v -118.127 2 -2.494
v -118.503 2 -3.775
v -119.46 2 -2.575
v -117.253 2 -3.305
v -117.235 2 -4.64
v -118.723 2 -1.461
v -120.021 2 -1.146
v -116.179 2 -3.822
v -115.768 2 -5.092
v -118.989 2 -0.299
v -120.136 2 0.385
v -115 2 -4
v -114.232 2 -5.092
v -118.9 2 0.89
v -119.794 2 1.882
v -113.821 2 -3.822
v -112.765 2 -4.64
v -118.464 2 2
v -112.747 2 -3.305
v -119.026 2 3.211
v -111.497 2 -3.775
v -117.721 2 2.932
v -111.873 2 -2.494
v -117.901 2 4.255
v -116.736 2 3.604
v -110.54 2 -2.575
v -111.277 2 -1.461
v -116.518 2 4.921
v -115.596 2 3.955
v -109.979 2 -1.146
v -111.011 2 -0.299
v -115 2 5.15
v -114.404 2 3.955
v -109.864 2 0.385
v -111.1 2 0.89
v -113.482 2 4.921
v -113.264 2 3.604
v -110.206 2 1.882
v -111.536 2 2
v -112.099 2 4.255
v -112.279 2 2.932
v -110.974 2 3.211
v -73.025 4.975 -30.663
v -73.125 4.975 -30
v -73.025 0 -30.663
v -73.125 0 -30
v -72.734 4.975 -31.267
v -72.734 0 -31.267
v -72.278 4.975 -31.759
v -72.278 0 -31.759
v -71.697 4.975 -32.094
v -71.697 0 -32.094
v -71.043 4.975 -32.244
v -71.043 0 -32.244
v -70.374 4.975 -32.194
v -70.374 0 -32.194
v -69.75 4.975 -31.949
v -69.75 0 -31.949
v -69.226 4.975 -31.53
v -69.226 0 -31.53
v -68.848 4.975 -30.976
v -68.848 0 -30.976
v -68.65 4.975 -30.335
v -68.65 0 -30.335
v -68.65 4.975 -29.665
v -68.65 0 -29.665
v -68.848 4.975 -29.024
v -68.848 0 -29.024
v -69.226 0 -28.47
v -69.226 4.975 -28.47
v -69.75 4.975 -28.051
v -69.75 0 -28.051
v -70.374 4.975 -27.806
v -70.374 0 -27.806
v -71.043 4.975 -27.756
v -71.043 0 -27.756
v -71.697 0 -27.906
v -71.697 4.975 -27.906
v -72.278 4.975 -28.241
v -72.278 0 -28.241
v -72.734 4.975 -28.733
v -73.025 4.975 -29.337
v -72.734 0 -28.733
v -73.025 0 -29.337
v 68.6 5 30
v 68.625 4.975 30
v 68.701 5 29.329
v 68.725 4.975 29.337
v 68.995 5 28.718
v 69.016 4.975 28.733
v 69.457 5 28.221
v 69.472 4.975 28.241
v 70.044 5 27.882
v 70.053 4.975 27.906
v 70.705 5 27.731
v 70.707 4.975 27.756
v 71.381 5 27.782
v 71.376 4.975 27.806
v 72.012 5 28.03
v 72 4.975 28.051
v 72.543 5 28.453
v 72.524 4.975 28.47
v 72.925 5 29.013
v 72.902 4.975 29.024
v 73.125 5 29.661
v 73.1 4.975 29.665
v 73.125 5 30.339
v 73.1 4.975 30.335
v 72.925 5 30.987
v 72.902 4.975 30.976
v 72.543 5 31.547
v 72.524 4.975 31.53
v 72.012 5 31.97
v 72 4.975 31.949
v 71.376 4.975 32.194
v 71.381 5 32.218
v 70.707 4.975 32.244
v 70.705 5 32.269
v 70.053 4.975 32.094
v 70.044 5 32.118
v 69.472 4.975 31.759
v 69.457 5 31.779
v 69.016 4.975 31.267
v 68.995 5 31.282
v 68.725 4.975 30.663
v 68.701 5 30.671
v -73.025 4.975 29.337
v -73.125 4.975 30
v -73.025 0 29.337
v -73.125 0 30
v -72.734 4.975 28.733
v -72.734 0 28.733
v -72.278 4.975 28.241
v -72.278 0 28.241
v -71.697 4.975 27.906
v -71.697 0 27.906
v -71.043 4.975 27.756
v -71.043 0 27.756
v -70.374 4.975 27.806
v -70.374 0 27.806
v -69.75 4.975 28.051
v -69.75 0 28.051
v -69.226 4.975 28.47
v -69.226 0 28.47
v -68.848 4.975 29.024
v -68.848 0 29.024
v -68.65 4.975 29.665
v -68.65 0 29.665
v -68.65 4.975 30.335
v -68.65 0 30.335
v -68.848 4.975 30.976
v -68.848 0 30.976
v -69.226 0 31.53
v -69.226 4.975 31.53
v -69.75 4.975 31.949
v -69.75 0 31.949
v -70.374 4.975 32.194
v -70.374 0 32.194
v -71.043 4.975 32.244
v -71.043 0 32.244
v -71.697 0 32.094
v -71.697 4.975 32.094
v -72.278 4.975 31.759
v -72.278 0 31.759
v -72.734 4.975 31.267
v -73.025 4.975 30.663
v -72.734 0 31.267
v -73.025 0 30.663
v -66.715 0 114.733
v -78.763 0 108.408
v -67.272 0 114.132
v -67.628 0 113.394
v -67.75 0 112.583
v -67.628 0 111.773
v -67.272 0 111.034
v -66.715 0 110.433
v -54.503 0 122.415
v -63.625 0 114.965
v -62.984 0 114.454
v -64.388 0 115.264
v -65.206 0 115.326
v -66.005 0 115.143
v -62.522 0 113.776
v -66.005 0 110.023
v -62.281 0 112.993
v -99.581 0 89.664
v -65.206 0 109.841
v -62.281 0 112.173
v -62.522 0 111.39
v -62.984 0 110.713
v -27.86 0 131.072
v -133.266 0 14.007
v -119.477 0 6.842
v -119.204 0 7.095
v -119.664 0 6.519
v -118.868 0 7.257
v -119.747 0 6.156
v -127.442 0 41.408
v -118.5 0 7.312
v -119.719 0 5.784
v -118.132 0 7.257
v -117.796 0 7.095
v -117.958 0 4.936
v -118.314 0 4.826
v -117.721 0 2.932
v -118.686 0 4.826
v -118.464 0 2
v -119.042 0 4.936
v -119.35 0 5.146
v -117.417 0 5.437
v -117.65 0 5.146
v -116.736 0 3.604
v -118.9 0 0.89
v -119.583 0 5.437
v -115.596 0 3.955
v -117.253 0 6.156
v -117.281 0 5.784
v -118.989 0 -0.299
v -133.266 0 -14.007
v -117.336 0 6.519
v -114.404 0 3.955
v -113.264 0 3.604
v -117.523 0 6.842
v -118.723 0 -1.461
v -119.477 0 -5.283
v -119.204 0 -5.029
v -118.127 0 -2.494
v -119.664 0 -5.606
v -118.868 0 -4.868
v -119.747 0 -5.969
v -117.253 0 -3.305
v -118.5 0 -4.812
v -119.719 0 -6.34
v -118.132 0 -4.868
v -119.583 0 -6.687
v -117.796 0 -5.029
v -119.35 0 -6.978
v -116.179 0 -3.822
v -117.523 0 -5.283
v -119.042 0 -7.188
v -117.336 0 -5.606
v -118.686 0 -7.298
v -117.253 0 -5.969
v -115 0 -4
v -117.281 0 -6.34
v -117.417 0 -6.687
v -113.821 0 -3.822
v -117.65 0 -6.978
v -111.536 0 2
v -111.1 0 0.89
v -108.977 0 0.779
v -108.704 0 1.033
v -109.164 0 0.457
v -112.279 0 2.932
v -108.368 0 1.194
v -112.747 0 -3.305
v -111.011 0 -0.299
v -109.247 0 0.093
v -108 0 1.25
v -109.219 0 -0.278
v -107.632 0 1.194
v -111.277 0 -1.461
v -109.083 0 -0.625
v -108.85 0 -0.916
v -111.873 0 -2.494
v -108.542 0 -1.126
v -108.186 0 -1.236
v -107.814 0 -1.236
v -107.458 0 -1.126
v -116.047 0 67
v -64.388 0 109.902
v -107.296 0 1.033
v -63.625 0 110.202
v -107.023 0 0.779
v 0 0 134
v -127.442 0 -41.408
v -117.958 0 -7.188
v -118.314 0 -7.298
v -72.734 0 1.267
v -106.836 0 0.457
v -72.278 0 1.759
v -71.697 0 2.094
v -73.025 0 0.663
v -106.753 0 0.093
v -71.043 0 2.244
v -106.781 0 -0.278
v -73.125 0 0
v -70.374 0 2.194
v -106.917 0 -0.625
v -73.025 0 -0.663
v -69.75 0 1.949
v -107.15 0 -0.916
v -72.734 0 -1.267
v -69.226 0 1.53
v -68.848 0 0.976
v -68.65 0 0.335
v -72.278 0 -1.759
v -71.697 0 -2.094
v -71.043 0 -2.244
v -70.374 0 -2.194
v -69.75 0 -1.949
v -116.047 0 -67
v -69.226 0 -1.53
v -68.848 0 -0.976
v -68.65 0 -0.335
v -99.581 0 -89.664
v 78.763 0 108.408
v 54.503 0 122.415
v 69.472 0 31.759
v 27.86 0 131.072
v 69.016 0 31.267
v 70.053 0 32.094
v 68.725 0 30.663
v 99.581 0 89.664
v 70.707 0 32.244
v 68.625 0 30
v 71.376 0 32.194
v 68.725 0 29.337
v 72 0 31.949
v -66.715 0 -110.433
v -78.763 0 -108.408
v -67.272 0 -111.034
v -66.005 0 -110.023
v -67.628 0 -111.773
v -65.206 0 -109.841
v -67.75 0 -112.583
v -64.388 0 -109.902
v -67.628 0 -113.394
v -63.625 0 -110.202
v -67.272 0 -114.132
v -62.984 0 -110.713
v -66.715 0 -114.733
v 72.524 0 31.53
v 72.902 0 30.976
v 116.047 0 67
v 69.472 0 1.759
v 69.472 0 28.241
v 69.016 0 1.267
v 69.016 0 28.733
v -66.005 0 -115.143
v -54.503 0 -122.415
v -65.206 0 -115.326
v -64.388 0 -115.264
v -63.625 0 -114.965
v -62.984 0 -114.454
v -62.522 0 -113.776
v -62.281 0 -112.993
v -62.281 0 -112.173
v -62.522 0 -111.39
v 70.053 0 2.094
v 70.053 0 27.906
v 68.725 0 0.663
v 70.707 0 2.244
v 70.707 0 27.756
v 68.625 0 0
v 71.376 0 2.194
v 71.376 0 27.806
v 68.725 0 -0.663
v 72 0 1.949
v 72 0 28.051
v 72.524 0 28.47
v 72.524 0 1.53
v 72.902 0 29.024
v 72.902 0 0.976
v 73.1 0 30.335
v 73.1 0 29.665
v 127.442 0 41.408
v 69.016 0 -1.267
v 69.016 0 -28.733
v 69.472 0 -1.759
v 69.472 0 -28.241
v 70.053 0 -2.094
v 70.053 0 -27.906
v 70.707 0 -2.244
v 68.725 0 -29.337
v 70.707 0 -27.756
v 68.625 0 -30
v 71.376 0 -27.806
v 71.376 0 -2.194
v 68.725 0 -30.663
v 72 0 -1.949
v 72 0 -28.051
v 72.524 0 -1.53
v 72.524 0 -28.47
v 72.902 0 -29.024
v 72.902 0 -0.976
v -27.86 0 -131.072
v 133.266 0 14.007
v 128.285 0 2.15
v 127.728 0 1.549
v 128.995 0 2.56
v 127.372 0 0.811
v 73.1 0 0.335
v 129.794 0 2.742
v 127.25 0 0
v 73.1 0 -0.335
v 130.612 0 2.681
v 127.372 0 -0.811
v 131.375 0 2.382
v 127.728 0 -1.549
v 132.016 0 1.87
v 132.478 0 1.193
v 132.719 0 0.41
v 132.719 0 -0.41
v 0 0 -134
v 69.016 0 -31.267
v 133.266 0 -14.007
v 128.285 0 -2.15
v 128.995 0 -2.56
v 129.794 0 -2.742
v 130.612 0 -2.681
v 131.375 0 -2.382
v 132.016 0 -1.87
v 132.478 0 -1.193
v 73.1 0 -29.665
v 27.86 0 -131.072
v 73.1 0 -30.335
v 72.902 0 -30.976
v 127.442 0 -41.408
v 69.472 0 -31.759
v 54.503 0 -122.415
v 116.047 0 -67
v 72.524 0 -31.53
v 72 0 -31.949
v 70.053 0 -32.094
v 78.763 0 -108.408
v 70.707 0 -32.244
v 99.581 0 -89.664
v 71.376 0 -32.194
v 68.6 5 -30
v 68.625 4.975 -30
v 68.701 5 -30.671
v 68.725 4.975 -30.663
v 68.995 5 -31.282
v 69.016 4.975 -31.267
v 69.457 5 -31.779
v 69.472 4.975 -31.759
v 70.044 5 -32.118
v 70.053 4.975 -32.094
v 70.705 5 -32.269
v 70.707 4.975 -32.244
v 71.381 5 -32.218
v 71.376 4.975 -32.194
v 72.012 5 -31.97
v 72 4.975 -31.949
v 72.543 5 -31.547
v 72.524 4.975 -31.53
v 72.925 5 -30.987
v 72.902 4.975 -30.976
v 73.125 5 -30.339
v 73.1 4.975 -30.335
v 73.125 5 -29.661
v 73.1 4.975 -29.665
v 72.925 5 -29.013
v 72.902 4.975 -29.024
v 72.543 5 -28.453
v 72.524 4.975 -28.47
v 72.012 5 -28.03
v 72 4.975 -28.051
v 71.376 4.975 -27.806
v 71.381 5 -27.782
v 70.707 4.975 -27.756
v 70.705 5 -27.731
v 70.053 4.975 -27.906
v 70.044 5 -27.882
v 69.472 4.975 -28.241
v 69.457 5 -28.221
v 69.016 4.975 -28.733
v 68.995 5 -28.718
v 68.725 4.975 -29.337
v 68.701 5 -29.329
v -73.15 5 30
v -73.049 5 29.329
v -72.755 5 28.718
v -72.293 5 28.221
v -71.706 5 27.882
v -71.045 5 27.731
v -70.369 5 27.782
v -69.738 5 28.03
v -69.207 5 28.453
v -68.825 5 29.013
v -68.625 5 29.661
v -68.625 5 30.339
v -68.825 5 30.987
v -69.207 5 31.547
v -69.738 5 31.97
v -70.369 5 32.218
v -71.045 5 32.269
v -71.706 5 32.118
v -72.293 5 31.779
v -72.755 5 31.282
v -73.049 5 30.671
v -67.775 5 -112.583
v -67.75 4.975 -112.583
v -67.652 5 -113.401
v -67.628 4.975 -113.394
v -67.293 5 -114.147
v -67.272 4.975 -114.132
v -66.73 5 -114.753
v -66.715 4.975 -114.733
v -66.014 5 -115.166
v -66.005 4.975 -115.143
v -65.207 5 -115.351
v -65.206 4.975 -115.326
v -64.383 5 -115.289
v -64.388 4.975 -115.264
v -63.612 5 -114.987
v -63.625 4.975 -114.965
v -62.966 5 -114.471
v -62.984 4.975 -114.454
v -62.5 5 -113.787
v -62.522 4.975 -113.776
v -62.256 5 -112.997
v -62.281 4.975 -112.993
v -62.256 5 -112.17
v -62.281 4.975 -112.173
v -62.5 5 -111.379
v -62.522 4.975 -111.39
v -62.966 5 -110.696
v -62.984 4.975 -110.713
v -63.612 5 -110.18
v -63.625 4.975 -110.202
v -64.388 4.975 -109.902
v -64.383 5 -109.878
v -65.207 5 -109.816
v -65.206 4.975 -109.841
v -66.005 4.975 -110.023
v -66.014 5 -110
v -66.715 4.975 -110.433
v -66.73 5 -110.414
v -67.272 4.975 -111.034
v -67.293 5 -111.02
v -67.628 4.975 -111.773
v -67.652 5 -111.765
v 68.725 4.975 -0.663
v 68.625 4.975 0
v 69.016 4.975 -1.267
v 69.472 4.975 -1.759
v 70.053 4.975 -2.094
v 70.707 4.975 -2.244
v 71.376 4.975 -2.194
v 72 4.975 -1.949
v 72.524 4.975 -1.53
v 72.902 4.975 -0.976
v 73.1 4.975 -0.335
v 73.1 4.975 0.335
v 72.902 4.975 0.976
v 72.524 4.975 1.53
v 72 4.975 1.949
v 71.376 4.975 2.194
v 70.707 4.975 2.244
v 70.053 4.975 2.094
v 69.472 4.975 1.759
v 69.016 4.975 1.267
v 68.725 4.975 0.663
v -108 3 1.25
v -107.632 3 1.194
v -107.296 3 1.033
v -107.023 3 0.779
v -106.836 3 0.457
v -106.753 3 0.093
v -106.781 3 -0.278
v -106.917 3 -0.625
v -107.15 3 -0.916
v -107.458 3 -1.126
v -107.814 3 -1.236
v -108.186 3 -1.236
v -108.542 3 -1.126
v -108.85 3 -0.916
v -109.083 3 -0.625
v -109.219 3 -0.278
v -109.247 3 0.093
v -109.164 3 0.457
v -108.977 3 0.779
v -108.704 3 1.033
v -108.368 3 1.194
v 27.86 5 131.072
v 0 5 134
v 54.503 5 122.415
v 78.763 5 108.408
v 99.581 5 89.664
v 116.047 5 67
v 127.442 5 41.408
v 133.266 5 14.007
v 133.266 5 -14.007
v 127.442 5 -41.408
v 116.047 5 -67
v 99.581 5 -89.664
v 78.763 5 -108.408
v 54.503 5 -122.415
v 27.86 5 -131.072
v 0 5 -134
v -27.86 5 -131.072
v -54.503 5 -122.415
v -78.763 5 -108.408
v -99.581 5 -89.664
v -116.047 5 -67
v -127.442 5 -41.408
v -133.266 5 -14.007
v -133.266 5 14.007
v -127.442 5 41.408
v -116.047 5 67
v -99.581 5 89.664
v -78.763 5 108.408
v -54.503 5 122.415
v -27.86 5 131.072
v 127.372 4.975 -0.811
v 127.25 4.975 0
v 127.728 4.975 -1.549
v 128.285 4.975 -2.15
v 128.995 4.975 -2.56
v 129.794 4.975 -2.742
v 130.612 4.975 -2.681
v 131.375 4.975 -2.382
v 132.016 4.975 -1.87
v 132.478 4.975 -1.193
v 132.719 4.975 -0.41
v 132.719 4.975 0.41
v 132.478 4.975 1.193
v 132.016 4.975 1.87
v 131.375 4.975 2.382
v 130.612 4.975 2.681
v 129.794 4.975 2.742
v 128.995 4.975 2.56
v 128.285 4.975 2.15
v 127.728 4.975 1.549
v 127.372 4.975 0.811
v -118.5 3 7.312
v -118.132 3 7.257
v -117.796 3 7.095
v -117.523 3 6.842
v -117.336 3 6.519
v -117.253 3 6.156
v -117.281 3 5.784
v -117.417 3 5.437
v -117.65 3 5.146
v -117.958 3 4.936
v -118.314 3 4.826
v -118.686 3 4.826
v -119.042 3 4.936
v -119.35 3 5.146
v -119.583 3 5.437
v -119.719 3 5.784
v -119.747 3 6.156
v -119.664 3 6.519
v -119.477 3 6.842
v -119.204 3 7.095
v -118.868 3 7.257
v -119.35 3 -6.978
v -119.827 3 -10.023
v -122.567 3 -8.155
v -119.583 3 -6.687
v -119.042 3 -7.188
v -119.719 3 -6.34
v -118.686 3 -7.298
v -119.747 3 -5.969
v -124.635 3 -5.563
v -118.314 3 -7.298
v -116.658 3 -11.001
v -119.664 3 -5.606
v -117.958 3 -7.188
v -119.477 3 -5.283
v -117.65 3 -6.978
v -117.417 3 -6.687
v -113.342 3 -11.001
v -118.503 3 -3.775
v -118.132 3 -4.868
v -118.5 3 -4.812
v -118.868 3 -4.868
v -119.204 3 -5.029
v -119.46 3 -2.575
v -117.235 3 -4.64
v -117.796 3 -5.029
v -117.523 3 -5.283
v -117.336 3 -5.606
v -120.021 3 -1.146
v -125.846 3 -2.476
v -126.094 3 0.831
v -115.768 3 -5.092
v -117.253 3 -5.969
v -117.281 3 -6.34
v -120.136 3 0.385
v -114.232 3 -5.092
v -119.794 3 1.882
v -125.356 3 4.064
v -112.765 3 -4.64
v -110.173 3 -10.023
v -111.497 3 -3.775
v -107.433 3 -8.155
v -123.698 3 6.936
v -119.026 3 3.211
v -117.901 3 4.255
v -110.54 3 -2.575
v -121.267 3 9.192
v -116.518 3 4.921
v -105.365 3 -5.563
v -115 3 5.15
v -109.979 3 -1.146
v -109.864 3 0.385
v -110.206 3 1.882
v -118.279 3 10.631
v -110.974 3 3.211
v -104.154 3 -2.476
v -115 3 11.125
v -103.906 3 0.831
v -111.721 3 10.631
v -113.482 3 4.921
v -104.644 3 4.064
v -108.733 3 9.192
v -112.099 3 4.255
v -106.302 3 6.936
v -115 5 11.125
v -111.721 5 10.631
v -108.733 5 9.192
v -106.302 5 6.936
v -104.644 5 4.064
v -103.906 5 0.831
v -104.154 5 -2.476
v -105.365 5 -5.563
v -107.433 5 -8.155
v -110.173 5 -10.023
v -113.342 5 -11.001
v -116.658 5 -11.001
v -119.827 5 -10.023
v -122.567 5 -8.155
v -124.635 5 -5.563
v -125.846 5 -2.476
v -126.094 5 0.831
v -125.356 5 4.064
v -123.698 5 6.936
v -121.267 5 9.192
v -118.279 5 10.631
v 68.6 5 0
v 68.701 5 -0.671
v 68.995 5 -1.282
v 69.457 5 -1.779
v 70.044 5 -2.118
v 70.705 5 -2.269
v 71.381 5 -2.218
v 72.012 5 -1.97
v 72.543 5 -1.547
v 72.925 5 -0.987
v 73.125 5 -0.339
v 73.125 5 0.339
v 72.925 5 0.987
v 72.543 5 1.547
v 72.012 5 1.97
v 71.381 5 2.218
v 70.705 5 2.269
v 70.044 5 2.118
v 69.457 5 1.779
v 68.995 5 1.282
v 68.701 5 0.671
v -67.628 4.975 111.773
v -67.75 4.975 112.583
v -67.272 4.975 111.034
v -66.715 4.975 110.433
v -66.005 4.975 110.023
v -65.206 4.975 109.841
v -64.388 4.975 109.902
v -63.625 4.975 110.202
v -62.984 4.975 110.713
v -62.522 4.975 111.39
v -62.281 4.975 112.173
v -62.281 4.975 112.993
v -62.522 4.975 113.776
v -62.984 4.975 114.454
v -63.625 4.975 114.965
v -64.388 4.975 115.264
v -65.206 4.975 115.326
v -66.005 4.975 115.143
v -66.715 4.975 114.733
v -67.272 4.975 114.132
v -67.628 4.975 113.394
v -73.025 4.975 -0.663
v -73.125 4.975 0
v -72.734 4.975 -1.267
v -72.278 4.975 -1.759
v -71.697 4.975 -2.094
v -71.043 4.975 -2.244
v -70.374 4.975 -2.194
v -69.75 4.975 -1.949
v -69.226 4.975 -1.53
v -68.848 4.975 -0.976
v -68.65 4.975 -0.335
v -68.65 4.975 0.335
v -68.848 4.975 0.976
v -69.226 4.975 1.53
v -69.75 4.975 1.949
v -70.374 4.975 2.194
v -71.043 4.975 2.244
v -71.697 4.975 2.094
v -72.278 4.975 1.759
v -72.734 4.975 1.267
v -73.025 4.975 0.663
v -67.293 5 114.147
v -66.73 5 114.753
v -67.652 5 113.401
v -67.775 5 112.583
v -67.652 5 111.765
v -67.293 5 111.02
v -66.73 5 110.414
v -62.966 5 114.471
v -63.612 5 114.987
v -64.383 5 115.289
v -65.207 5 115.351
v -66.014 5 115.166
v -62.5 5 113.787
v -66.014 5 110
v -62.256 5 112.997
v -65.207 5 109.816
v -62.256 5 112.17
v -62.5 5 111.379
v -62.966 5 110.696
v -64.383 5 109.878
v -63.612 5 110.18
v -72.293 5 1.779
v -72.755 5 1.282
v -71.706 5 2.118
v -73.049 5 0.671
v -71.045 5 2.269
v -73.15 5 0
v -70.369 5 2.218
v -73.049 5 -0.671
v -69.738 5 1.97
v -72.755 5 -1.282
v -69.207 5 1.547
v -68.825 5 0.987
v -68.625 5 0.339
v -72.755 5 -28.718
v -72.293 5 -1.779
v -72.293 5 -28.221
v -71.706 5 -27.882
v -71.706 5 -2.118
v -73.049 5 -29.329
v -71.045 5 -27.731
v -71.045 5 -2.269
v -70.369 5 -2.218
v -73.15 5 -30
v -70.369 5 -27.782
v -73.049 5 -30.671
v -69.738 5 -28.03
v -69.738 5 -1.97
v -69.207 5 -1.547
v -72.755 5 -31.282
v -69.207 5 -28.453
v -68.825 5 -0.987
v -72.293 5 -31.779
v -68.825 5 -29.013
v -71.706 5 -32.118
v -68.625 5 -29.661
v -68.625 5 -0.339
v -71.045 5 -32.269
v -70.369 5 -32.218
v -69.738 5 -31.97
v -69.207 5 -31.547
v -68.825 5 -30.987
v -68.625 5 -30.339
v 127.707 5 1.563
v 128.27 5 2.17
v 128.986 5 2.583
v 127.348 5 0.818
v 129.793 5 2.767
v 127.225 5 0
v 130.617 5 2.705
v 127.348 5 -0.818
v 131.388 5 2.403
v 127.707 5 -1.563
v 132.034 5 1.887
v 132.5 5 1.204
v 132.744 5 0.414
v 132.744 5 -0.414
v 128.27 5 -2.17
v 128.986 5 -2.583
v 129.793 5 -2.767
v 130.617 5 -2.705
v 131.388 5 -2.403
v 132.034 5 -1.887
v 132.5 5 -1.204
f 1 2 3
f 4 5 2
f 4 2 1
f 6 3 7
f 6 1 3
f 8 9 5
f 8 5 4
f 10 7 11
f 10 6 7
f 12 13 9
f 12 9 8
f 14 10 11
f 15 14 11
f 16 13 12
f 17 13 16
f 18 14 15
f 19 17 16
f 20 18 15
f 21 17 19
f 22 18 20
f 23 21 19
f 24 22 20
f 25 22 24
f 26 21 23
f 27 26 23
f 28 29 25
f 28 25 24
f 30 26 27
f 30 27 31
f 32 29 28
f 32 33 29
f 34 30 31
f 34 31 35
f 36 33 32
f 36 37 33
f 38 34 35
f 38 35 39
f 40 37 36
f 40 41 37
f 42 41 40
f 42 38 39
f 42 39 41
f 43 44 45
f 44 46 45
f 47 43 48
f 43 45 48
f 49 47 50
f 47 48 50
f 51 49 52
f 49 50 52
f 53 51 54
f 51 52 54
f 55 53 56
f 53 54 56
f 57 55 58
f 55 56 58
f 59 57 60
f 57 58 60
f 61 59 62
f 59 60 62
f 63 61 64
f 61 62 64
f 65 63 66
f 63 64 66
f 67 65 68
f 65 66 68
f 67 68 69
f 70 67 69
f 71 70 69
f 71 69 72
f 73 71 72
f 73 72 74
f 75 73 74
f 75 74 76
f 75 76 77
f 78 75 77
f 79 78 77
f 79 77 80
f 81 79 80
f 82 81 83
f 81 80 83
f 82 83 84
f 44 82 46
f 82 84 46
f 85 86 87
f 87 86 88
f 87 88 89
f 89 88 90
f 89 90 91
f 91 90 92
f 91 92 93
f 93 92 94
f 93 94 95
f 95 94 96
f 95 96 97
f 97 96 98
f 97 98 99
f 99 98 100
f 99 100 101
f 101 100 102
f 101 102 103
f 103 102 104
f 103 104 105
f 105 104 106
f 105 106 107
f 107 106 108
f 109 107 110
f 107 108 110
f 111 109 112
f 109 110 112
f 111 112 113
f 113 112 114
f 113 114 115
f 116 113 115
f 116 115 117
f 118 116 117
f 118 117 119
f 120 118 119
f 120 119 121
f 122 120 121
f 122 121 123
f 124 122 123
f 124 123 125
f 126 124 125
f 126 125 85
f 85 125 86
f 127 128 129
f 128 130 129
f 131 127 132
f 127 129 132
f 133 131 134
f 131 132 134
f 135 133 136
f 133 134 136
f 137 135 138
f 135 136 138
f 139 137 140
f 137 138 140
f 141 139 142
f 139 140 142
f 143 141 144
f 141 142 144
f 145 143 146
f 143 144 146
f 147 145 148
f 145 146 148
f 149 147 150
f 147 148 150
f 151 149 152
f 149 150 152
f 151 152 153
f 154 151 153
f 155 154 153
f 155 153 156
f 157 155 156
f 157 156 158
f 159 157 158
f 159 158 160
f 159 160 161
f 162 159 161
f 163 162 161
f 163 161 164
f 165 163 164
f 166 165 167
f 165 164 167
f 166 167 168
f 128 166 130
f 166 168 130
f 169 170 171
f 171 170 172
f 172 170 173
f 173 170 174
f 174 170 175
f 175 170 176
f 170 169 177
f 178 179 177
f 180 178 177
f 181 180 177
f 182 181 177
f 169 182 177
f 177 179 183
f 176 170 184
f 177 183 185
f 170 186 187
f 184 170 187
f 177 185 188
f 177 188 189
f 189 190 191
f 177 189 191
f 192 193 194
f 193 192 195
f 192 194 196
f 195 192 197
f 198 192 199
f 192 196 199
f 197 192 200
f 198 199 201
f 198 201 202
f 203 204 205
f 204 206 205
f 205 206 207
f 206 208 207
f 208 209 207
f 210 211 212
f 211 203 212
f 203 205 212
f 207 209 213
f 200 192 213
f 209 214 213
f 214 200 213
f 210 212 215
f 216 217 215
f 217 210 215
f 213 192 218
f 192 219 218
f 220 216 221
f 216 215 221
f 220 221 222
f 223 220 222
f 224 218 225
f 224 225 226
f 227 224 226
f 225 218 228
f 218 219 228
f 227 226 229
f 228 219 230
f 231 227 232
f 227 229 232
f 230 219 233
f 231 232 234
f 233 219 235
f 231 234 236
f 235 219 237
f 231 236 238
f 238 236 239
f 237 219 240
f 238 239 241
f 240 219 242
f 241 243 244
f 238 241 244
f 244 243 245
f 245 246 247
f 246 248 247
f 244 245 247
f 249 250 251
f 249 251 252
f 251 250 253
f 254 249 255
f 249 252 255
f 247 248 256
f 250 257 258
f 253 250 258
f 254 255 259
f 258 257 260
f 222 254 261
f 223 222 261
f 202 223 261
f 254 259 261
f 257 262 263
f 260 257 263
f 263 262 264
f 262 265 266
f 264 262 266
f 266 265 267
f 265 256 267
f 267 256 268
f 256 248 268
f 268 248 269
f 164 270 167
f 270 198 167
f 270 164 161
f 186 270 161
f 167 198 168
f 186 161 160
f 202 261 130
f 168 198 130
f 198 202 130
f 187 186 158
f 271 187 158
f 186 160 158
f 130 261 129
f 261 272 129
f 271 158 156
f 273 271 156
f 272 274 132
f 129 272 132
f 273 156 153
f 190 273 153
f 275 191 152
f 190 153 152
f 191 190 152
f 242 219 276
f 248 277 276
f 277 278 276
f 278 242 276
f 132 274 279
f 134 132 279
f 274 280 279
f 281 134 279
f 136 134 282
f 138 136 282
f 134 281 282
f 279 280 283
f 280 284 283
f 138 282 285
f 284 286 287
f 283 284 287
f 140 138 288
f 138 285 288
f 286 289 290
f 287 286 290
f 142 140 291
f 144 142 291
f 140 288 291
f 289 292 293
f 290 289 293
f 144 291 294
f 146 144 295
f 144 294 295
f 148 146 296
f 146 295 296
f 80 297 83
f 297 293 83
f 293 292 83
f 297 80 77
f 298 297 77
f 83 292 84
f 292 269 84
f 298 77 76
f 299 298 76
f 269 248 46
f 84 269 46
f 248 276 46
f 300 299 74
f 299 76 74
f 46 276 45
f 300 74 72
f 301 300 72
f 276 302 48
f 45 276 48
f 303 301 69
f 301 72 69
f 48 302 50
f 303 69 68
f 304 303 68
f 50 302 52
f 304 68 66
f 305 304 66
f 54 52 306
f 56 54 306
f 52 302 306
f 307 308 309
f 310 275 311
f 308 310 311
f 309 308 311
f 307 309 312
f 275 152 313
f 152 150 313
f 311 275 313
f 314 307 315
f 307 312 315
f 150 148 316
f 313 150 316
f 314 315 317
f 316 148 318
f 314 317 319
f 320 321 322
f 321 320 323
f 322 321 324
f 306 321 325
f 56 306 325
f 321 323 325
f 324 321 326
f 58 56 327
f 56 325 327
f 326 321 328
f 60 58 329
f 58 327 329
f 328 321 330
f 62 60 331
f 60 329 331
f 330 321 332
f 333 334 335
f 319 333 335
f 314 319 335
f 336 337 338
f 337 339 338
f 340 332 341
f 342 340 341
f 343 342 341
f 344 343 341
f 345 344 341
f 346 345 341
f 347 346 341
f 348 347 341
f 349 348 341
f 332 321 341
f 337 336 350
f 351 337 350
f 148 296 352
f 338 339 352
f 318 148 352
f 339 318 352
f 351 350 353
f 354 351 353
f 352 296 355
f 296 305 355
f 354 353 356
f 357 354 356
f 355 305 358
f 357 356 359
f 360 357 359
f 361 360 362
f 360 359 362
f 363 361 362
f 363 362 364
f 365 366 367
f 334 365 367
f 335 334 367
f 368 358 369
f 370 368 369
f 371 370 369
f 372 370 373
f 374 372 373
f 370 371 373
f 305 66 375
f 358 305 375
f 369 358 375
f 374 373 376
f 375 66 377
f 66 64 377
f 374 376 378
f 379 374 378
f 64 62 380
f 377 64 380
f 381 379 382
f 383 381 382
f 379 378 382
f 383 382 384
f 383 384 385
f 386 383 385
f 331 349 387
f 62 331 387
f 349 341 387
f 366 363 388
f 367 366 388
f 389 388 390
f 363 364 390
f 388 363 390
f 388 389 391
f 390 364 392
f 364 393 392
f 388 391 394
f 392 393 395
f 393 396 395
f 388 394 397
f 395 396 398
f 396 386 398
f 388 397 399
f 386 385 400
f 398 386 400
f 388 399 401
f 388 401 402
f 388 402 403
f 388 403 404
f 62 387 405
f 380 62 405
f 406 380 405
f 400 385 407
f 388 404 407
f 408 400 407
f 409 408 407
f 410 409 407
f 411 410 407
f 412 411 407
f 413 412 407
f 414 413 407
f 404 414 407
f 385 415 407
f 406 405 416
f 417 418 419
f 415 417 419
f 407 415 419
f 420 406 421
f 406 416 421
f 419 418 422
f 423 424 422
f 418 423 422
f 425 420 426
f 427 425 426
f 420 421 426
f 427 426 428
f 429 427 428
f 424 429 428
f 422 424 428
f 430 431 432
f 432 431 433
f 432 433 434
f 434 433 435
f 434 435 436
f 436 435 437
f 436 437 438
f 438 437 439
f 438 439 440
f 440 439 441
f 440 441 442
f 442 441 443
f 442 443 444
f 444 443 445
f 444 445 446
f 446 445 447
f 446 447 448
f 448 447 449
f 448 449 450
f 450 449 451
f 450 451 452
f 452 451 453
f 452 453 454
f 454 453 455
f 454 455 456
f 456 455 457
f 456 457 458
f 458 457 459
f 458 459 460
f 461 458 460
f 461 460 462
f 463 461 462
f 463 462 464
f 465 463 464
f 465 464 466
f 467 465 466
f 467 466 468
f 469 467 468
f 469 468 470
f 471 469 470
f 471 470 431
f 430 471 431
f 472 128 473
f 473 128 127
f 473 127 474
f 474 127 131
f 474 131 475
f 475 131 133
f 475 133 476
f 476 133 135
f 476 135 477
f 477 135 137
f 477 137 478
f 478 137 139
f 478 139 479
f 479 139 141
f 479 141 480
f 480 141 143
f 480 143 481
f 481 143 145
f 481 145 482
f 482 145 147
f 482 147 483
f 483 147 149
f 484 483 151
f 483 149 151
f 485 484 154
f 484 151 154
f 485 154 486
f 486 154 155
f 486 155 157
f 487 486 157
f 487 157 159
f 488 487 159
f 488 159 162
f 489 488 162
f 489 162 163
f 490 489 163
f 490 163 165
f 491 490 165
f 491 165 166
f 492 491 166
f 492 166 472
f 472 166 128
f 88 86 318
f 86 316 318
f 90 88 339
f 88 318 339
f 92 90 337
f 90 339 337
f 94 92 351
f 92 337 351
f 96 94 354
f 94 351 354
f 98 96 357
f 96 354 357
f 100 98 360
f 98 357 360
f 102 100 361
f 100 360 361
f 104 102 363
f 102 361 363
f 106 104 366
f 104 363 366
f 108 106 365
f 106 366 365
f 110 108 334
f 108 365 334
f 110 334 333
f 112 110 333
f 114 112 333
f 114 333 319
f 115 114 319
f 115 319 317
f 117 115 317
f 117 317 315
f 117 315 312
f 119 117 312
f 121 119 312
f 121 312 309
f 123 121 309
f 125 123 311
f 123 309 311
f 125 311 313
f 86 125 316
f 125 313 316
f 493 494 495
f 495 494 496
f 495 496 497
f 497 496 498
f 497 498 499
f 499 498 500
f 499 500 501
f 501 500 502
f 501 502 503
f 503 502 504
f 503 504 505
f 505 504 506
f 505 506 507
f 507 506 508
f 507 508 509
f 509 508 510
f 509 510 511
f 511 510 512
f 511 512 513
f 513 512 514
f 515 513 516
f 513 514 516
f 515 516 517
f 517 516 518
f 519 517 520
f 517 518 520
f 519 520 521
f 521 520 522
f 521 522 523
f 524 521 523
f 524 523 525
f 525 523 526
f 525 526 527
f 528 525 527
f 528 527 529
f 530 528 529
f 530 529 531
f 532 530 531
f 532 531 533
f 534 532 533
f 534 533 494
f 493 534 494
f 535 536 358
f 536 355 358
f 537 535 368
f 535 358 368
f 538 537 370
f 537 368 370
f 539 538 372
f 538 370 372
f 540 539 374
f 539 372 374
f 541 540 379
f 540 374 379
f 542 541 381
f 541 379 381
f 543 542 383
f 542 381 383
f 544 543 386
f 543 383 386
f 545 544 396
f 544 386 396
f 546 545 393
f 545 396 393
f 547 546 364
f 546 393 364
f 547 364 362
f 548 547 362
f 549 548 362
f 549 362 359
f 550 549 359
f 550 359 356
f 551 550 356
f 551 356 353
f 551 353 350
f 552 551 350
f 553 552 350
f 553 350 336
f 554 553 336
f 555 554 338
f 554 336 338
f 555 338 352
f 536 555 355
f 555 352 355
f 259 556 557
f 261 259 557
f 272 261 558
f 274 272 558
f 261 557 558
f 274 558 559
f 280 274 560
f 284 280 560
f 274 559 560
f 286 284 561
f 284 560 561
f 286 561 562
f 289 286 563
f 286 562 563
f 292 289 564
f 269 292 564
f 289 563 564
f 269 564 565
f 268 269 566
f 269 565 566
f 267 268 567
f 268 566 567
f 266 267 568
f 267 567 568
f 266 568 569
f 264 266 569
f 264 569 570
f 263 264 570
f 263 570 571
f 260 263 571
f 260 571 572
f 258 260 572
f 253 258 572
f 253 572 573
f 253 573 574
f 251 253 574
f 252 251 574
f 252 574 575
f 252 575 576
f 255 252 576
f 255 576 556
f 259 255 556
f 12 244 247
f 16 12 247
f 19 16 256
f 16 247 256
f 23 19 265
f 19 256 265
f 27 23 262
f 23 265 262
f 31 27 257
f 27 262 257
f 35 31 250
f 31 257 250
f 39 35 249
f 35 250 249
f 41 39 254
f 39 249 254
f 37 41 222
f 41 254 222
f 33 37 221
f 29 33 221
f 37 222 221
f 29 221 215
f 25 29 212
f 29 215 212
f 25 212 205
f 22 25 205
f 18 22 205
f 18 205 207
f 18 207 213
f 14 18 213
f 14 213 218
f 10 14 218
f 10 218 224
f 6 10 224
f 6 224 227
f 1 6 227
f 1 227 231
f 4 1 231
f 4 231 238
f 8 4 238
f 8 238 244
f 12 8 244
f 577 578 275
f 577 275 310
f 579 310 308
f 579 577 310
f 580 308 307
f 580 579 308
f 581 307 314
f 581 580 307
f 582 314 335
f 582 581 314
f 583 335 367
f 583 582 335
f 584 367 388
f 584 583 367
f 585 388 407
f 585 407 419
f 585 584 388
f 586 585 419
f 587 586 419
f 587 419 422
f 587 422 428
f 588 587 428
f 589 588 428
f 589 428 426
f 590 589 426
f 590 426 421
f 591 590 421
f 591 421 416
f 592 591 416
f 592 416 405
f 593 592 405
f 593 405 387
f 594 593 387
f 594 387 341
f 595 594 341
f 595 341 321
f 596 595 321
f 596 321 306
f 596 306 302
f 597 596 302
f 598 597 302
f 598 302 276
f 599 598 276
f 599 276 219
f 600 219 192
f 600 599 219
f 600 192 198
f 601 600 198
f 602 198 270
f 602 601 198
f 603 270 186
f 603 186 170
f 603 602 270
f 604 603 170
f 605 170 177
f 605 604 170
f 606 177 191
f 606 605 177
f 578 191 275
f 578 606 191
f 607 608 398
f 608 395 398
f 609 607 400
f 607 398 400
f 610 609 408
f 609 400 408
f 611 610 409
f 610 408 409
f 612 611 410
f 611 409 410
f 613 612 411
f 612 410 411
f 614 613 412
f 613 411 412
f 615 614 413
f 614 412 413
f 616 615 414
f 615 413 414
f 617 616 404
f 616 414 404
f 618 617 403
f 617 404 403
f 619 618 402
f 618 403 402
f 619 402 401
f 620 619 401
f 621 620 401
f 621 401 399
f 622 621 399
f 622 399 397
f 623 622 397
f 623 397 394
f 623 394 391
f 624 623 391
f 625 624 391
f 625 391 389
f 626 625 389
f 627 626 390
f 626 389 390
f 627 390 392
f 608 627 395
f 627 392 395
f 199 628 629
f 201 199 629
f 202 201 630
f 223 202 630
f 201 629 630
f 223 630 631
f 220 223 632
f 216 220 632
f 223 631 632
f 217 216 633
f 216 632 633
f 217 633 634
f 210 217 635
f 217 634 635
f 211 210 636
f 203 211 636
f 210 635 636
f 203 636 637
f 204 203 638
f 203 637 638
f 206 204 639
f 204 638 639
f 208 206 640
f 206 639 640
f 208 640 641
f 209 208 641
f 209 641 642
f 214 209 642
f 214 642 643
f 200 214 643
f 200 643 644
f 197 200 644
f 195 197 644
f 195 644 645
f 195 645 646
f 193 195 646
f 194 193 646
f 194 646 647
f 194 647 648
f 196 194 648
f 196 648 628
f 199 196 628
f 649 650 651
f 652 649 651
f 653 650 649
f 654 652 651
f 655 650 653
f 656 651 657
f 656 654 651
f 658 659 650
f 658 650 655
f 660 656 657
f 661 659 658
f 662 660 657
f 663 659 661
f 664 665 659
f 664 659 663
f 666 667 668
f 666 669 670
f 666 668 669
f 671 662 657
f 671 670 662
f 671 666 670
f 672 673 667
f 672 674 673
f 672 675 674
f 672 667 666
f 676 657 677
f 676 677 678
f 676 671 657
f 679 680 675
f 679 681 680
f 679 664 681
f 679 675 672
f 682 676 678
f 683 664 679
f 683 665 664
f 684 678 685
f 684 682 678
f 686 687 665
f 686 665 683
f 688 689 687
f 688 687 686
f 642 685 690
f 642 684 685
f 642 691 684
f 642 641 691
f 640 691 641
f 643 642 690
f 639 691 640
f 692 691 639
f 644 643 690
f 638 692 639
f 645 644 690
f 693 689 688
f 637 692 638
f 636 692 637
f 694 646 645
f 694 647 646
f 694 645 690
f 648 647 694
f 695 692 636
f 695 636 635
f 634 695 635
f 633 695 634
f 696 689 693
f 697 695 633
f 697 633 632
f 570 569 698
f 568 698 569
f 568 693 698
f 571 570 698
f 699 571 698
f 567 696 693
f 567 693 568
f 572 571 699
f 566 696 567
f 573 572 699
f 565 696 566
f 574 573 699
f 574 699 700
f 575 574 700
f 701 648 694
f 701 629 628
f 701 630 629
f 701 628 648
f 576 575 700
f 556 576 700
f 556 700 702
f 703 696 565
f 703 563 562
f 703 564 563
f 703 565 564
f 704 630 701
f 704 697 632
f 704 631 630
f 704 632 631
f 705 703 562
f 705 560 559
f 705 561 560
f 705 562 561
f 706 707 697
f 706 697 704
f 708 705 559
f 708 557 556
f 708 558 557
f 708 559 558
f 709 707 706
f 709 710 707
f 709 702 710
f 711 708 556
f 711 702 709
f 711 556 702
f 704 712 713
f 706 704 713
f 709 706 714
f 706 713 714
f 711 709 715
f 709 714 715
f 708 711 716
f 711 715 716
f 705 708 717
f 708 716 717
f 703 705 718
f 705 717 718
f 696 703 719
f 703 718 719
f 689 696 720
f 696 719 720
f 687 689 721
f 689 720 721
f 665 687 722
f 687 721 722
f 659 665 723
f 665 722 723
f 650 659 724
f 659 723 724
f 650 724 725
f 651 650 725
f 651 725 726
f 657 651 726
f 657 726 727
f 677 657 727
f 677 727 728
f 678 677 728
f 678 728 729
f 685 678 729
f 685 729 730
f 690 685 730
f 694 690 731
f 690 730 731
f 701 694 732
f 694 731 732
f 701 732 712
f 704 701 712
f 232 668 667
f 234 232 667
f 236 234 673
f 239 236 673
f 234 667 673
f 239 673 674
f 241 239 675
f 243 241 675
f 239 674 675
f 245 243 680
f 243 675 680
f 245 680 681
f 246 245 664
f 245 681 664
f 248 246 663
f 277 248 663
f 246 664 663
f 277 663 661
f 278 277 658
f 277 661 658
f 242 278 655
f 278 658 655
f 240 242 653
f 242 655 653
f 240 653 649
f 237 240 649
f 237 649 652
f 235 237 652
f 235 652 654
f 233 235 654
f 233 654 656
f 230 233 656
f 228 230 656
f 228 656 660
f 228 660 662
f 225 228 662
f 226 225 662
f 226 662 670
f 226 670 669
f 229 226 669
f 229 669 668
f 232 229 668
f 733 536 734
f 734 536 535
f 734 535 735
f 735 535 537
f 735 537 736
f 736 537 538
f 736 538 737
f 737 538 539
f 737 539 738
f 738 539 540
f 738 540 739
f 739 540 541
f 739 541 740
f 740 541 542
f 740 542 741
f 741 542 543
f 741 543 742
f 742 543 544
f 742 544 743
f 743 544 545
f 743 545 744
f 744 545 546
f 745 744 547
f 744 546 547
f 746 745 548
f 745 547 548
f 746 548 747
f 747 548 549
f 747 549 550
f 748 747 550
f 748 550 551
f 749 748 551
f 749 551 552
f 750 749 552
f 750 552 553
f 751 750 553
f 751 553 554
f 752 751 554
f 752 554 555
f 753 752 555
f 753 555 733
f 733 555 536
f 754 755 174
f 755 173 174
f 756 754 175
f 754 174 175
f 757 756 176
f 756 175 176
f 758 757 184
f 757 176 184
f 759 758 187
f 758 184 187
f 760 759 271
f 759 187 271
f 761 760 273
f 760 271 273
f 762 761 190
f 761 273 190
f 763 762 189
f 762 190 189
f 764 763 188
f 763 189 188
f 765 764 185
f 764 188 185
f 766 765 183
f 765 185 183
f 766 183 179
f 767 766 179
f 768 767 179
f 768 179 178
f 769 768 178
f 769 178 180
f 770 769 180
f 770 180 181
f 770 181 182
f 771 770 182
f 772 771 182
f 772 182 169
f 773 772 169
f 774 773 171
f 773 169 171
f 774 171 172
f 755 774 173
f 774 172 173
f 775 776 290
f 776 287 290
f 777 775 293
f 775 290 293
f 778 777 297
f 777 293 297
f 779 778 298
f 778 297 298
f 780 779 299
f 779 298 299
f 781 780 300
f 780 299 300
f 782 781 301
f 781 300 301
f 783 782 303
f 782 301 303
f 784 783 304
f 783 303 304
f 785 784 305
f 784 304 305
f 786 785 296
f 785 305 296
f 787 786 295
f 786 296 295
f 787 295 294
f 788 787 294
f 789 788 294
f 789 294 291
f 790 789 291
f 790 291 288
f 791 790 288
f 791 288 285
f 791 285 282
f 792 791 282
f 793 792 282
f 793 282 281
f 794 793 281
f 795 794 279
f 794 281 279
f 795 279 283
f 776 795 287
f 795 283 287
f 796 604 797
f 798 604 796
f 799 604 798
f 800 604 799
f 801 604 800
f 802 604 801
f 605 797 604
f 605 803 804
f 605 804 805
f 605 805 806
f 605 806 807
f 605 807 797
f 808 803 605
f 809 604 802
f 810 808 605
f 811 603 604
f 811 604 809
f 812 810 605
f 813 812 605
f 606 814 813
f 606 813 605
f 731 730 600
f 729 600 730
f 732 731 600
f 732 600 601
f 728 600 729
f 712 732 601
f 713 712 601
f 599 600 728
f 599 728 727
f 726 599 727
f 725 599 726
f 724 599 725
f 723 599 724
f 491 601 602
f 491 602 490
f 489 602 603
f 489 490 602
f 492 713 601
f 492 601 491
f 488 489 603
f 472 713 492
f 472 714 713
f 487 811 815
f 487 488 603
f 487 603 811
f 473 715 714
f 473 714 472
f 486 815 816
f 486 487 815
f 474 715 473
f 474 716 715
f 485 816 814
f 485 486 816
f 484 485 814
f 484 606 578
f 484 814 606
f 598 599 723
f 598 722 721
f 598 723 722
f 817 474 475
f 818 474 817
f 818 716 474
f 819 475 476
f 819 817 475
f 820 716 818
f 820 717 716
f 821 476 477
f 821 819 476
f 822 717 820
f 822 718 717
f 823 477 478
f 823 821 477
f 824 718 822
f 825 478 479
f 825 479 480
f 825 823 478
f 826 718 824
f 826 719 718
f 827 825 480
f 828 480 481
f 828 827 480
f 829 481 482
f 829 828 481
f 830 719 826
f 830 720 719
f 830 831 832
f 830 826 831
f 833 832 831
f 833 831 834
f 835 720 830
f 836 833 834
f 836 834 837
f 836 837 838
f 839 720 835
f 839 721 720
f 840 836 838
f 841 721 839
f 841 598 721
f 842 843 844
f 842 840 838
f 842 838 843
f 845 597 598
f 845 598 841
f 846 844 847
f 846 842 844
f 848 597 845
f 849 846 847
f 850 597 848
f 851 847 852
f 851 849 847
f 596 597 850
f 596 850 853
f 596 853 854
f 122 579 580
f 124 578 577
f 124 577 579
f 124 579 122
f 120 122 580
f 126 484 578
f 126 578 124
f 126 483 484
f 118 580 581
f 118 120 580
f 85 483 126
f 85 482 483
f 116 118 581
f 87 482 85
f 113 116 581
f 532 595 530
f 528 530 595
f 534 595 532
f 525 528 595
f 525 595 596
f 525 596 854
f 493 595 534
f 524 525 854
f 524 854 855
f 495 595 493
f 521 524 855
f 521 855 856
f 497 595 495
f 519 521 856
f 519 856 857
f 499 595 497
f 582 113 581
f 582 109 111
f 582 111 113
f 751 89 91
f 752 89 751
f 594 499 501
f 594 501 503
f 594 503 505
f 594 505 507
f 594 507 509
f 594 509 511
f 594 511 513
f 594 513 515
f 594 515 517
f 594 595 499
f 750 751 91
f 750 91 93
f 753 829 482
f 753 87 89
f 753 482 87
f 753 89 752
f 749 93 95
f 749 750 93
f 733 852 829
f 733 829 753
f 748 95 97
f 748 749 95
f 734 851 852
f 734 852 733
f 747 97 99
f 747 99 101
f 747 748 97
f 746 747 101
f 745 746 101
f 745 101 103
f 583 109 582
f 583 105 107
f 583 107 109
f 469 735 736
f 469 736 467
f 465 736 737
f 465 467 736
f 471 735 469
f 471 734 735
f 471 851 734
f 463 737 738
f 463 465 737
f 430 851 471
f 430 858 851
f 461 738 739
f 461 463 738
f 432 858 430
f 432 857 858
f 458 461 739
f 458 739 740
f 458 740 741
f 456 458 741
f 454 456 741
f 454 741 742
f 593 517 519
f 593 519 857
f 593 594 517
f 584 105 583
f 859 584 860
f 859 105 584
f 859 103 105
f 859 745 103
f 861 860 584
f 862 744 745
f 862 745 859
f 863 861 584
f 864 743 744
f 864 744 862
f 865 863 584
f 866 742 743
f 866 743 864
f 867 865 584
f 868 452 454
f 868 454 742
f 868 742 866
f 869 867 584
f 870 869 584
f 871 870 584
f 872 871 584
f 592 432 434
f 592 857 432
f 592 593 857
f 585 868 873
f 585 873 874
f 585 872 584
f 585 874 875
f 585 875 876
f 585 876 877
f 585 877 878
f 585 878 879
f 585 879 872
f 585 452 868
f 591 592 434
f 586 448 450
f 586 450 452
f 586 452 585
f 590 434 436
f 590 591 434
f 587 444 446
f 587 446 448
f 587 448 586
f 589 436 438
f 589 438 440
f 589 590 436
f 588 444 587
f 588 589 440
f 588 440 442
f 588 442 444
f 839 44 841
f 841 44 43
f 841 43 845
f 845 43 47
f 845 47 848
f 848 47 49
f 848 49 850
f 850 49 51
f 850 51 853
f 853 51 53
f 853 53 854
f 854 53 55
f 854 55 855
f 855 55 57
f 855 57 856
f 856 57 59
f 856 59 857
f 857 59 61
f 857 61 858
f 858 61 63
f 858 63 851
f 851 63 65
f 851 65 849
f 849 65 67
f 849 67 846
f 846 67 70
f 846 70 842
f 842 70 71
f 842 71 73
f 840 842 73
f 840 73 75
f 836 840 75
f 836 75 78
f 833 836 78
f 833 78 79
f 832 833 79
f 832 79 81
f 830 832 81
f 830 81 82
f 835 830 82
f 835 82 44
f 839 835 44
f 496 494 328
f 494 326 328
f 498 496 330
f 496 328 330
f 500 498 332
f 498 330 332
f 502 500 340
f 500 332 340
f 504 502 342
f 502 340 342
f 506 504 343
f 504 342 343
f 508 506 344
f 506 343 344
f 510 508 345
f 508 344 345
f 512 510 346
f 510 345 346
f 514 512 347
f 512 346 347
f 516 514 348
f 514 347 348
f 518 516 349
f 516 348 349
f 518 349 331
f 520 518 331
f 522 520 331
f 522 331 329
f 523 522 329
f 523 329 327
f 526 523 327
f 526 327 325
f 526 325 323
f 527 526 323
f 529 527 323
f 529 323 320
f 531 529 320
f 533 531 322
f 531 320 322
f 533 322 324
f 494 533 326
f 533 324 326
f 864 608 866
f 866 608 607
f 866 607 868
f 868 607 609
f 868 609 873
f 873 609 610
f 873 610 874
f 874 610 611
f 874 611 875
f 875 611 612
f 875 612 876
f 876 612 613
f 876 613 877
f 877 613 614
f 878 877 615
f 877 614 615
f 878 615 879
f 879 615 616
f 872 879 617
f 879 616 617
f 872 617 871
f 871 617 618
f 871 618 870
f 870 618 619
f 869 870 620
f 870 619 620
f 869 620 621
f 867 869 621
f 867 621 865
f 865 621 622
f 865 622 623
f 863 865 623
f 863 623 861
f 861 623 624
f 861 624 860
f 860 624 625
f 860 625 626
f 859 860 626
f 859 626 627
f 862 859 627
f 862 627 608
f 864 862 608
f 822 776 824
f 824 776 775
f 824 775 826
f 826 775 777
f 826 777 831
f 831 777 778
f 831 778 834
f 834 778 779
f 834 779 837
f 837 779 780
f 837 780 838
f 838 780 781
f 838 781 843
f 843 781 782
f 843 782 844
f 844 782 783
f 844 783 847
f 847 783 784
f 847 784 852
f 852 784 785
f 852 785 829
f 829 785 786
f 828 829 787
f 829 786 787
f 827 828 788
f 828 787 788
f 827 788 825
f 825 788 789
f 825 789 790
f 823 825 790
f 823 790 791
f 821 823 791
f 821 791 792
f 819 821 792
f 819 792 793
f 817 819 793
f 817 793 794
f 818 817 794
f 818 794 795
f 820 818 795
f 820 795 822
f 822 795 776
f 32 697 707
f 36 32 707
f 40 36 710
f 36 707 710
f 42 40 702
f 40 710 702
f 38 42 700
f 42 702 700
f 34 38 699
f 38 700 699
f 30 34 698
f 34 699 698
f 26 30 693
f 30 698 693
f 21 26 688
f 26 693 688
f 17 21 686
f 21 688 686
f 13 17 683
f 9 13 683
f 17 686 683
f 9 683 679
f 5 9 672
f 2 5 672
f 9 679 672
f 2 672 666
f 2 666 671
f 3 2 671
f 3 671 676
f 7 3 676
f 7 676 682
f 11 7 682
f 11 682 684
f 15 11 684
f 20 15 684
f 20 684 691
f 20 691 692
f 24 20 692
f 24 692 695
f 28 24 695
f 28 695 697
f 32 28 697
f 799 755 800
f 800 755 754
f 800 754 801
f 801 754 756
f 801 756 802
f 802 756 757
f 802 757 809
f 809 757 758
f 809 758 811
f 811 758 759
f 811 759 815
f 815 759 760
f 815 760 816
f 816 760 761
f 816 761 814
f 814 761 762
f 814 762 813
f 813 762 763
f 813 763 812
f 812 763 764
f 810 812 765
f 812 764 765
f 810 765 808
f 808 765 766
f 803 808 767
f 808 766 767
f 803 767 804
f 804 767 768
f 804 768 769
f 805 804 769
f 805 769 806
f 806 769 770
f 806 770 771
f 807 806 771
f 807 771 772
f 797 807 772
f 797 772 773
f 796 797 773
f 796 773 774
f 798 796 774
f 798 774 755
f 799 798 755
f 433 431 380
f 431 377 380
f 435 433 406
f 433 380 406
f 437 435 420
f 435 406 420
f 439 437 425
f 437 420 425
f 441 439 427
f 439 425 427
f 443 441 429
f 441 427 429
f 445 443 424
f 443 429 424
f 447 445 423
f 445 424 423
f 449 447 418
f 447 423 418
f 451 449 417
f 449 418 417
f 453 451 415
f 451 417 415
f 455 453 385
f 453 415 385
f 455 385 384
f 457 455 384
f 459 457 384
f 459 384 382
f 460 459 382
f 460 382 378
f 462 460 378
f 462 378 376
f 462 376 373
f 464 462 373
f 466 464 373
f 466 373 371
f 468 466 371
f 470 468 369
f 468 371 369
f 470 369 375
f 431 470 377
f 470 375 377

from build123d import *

# Parameters (mm, degrees)
STOCK_NEW_TRACKER_1_OUTLINE_R  = 10.415
STOCK_NEW_TRACKER_1_DEPTH      = 10
FILLET1_R                      = 12.7
SKETCH6_R                      = 10.4
CUT_EXTRUDE5_DEPTH             = 243.280828936
CUT_EXTRUDE1_START             = -5
CUT_EXTRUDE1_DEPTH             = 5
SKETCH2_R                      = 10.415
SKETCH2_R_2                    = 4
BOSS_EXTRUDE1_DEPTH            = 5
SKETCH3_R                      = 5.15
CUT_EXTRUDE2_DEPTH             = 3
SKETCH4_R                      = 11.125
CUT_EXTRUDE3_DEPTH             = 2
SKETCH5_R                      = 1.25
CUT_EXTRUDE4_DEPTH             = 243.092957495
SKETCH7_R                      = 190
SKETCH7_R_2                    = 134
CUT_EXTRUDE6_DEPTH             = 243.126000399
M5_CLEARANCE_HOLE1_D           = 5.5
M5_CLEARANCE_HOLE1_DEPTH       = 7.5
M5_CLEARANCE_HOLE1_CSINK_D     = 5.55
M5_CLEARANCE_HOLE1_CSINK_ANGLE = 90
M5_CLEARANCE_HOLE1_TIP         = 1.652366702
M4_CLEARANCE_HOLE1_D           = 4.5
M4_CLEARANCE_HOLE1_DEPTH       = 7.5
M4_CLEARANCE_HOLE1_CSINK_D     = 4.55
M4_CLEARANCE_HOLE1_CSINK_ANGLE = 90
M4_CLEARANCE_HOLE1_TIP         = 1.351936393


# Read off the part's stored shape, not the designer's step: Stock-New_Tracker-1
with BuildPart() as part:
    # Stock-New_Tracker-1 outline → Stock-New_Tracker-1 (new body)
    with BuildSketch(Plane(origin=(0, 0, 0), x_dir=(1, 0, 0), z_dir=(0, 1, 0))):
        with BuildLine():
            ThreePointArc((144.666666667, 39.642849993), (-150, 0), (144.666666667, -39.642849993))
            ThreePointArc((144.666666667, -39.642849993), (190, 0), (144.666666667, 39.642849993))
        make_face()
        with Locations((168.805, 0)):
            Circle(STOCK_NEW_TRACKER_1_OUTLINE_R, mode=Mode.SUBTRACT)
    extrude(amount=STOCK_NEW_TRACKER_1_DEPTH)

    # Fillet1
    fillet1_edges = [part.edges().sort_by_distance(p)[0] for p in [
        (144.666666667, 5, 39.642849993),
        (144.666666667, 5, -39.642849993),
    ]]
    fillet(fillet1_edges, radius=FILLET1_R)

    # Sketch6 → Cut-Extrude5 (cut, through all)
    with BuildSketch(Plane.XZ):
        with Locations(Location((-115, 0, 0), (0, 0, 270))):
            Circle(SKETCH6_R)
    extrude(amount=-CUT_EXTRUDE5_DEPTH, mode=Mode.SUBTRACT)

    # Sketch1 → Cut-Extrude1 (cut)
    with BuildSketch(Plane(origin=(0, 10, 0), x_dir=(1, 0, 0), z_dir=(0, 1, 0)).offset(CUT_EXTRUDE1_START)):
        with BuildLine():
            ThreePointArc((153.020872865, -39.885765971), (190, 0), (153.020872865, 39.885765971))
            ThreePointArc((153.020872865, 39.885765971), (146.205916285, 42.506906245), (141.960663798, 48.447599878))
            ThreePointArc((141.960663798, 48.447599878), (-150, 0), (141.960663798, -48.447599878))
            ThreePointArc((141.960663798, -48.447599878), (146.205916285, -42.506906245), (153.020872865, -39.885765971))
        make_face()
    extrude(amount=CUT_EXTRUDE1_DEPTH, mode=Mode.SUBTRACT)

    # Sketch2 → Boss-Extrude1 (add)
    with BuildSketch(Plane.XZ):
        with Locations((-115, 0)):
            Circle(SKETCH2_R)
        with Locations(Location((-115, 0, 0), (0, 0, 270))):
            Circle(SKETCH2_R_2, mode=Mode.SUBTRACT)
    extrude(amount=-BOSS_EXTRUDE1_DEPTH)

    # Sketch3 → Cut-Extrude2 (cut)
    with BuildSketch(Plane(origin=(0, 5, 0), x_dir=(1, 0, 0), z_dir=(0, 1, 0))):
        with Locations(Location((-115, 0, 0), (0, 0, 270))):
            Circle(SKETCH3_R)
    extrude(amount=-CUT_EXTRUDE2_DEPTH, mode=Mode.SUBTRACT)

    # Sketch4 → Cut-Extrude3 (cut)
    with BuildSketch(Plane(origin=(0, 5, 0), x_dir=(1, 0, 0), z_dir=(0, 1, 0))):
        with Locations(Location((-115, 0, 0), (0, 0, 270))):
            Circle(SKETCH4_R)
    extrude(amount=-CUT_EXTRUDE3_DEPTH, mode=Mode.SUBTRACT)

    # Sketch5 → Cut-Extrude4 (cut, through all)
    with BuildSketch(Plane(origin=(0, 3, 0), x_dir=(1, 0, 0), z_dir=(0, 1, 0))):
        with Locations(Location((-118.5, -6.062177826, 0), (0, 0, 270))):
            Circle(SKETCH5_R)
        with Locations(Location((-118.5, 6.062177826, 0), (0, 0, 270))):
            Circle(SKETCH5_R)
        with Locations(Location((-108, 0, 0), (0, 0, 270))):
            Circle(SKETCH5_R)
    extrude(amount=-CUT_EXTRUDE4_DEPTH, mode=Mode.SUBTRACT)

    # Sketch7 → Cut-Extrude6 (cut, through all)
    with BuildSketch(Plane(origin=(0, 5, 0), x_dir=(1, 0, 0), z_dir=(0, 1, 0))):
        Circle(SKETCH7_R)
        with Locations(Location((0, 0, 0), (0, 0, 270))):
            Circle(SKETCH7_R_2, mode=Mode.SUBTRACT)
    extrude(amount=-CUT_EXTRUDE6_DEPTH, mode=Mode.SUBTRACT)

    # M5 Clearance Hole1
    with Locations(Plane(origin=(0, 5, 0), x_dir=(1, 0, 0), z_dir=(0, 1, 0))):
        with Locations((-65, 112.583302492), (130, 0), (-65, -112.583302492)):
            CounterSinkHole(M5_CLEARANCE_HOLE1_D / 2, M5_CLEARANCE_HOLE1_CSINK_D / 2, depth=M5_CLEARANCE_HOLE1_DEPTH, counter_sink_angle=M5_CLEARANCE_HOLE1_CSINK_ANGLE)
            with Locations((0, 0, -(M5_CLEARANCE_HOLE1_DEPTH + M5_CLEARANCE_HOLE1_TIP / 2))):  # 118° drill point
                Cone(0, M5_CLEARANCE_HOLE1_D / 2, M5_CLEARANCE_HOLE1_TIP, mode=Mode.SUBTRACT)

    # M4 Clearance Hole1
    with Locations(Plane(origin=(0, 5, 0), x_dir=(1, 0, 0), z_dir=(0, 1, 0))):
        with Locations((-70.875, -30), (-70.875, 0), (-70.875, 30), (70.875, -30), (70.875, 0), (70.875, 30)):
            CounterSinkHole(M4_CLEARANCE_HOLE1_D / 2, M4_CLEARANCE_HOLE1_CSINK_D / 2, depth=M4_CLEARANCE_HOLE1_DEPTH, counter_sink_angle=M4_CLEARANCE_HOLE1_CSINK_ANGLE)
            with Locations((0, 0, -(M4_CLEARANCE_HOLE1_DEPTH + M4_CLEARANCE_HOLE1_TIP / 2))):  # 118° drill point
                Cone(0, M4_CLEARANCE_HOLE1_D / 2, M4_CLEARANCE_HOLE1_TIP, mode=Mode.SUBTRACT)


solid = part.part
